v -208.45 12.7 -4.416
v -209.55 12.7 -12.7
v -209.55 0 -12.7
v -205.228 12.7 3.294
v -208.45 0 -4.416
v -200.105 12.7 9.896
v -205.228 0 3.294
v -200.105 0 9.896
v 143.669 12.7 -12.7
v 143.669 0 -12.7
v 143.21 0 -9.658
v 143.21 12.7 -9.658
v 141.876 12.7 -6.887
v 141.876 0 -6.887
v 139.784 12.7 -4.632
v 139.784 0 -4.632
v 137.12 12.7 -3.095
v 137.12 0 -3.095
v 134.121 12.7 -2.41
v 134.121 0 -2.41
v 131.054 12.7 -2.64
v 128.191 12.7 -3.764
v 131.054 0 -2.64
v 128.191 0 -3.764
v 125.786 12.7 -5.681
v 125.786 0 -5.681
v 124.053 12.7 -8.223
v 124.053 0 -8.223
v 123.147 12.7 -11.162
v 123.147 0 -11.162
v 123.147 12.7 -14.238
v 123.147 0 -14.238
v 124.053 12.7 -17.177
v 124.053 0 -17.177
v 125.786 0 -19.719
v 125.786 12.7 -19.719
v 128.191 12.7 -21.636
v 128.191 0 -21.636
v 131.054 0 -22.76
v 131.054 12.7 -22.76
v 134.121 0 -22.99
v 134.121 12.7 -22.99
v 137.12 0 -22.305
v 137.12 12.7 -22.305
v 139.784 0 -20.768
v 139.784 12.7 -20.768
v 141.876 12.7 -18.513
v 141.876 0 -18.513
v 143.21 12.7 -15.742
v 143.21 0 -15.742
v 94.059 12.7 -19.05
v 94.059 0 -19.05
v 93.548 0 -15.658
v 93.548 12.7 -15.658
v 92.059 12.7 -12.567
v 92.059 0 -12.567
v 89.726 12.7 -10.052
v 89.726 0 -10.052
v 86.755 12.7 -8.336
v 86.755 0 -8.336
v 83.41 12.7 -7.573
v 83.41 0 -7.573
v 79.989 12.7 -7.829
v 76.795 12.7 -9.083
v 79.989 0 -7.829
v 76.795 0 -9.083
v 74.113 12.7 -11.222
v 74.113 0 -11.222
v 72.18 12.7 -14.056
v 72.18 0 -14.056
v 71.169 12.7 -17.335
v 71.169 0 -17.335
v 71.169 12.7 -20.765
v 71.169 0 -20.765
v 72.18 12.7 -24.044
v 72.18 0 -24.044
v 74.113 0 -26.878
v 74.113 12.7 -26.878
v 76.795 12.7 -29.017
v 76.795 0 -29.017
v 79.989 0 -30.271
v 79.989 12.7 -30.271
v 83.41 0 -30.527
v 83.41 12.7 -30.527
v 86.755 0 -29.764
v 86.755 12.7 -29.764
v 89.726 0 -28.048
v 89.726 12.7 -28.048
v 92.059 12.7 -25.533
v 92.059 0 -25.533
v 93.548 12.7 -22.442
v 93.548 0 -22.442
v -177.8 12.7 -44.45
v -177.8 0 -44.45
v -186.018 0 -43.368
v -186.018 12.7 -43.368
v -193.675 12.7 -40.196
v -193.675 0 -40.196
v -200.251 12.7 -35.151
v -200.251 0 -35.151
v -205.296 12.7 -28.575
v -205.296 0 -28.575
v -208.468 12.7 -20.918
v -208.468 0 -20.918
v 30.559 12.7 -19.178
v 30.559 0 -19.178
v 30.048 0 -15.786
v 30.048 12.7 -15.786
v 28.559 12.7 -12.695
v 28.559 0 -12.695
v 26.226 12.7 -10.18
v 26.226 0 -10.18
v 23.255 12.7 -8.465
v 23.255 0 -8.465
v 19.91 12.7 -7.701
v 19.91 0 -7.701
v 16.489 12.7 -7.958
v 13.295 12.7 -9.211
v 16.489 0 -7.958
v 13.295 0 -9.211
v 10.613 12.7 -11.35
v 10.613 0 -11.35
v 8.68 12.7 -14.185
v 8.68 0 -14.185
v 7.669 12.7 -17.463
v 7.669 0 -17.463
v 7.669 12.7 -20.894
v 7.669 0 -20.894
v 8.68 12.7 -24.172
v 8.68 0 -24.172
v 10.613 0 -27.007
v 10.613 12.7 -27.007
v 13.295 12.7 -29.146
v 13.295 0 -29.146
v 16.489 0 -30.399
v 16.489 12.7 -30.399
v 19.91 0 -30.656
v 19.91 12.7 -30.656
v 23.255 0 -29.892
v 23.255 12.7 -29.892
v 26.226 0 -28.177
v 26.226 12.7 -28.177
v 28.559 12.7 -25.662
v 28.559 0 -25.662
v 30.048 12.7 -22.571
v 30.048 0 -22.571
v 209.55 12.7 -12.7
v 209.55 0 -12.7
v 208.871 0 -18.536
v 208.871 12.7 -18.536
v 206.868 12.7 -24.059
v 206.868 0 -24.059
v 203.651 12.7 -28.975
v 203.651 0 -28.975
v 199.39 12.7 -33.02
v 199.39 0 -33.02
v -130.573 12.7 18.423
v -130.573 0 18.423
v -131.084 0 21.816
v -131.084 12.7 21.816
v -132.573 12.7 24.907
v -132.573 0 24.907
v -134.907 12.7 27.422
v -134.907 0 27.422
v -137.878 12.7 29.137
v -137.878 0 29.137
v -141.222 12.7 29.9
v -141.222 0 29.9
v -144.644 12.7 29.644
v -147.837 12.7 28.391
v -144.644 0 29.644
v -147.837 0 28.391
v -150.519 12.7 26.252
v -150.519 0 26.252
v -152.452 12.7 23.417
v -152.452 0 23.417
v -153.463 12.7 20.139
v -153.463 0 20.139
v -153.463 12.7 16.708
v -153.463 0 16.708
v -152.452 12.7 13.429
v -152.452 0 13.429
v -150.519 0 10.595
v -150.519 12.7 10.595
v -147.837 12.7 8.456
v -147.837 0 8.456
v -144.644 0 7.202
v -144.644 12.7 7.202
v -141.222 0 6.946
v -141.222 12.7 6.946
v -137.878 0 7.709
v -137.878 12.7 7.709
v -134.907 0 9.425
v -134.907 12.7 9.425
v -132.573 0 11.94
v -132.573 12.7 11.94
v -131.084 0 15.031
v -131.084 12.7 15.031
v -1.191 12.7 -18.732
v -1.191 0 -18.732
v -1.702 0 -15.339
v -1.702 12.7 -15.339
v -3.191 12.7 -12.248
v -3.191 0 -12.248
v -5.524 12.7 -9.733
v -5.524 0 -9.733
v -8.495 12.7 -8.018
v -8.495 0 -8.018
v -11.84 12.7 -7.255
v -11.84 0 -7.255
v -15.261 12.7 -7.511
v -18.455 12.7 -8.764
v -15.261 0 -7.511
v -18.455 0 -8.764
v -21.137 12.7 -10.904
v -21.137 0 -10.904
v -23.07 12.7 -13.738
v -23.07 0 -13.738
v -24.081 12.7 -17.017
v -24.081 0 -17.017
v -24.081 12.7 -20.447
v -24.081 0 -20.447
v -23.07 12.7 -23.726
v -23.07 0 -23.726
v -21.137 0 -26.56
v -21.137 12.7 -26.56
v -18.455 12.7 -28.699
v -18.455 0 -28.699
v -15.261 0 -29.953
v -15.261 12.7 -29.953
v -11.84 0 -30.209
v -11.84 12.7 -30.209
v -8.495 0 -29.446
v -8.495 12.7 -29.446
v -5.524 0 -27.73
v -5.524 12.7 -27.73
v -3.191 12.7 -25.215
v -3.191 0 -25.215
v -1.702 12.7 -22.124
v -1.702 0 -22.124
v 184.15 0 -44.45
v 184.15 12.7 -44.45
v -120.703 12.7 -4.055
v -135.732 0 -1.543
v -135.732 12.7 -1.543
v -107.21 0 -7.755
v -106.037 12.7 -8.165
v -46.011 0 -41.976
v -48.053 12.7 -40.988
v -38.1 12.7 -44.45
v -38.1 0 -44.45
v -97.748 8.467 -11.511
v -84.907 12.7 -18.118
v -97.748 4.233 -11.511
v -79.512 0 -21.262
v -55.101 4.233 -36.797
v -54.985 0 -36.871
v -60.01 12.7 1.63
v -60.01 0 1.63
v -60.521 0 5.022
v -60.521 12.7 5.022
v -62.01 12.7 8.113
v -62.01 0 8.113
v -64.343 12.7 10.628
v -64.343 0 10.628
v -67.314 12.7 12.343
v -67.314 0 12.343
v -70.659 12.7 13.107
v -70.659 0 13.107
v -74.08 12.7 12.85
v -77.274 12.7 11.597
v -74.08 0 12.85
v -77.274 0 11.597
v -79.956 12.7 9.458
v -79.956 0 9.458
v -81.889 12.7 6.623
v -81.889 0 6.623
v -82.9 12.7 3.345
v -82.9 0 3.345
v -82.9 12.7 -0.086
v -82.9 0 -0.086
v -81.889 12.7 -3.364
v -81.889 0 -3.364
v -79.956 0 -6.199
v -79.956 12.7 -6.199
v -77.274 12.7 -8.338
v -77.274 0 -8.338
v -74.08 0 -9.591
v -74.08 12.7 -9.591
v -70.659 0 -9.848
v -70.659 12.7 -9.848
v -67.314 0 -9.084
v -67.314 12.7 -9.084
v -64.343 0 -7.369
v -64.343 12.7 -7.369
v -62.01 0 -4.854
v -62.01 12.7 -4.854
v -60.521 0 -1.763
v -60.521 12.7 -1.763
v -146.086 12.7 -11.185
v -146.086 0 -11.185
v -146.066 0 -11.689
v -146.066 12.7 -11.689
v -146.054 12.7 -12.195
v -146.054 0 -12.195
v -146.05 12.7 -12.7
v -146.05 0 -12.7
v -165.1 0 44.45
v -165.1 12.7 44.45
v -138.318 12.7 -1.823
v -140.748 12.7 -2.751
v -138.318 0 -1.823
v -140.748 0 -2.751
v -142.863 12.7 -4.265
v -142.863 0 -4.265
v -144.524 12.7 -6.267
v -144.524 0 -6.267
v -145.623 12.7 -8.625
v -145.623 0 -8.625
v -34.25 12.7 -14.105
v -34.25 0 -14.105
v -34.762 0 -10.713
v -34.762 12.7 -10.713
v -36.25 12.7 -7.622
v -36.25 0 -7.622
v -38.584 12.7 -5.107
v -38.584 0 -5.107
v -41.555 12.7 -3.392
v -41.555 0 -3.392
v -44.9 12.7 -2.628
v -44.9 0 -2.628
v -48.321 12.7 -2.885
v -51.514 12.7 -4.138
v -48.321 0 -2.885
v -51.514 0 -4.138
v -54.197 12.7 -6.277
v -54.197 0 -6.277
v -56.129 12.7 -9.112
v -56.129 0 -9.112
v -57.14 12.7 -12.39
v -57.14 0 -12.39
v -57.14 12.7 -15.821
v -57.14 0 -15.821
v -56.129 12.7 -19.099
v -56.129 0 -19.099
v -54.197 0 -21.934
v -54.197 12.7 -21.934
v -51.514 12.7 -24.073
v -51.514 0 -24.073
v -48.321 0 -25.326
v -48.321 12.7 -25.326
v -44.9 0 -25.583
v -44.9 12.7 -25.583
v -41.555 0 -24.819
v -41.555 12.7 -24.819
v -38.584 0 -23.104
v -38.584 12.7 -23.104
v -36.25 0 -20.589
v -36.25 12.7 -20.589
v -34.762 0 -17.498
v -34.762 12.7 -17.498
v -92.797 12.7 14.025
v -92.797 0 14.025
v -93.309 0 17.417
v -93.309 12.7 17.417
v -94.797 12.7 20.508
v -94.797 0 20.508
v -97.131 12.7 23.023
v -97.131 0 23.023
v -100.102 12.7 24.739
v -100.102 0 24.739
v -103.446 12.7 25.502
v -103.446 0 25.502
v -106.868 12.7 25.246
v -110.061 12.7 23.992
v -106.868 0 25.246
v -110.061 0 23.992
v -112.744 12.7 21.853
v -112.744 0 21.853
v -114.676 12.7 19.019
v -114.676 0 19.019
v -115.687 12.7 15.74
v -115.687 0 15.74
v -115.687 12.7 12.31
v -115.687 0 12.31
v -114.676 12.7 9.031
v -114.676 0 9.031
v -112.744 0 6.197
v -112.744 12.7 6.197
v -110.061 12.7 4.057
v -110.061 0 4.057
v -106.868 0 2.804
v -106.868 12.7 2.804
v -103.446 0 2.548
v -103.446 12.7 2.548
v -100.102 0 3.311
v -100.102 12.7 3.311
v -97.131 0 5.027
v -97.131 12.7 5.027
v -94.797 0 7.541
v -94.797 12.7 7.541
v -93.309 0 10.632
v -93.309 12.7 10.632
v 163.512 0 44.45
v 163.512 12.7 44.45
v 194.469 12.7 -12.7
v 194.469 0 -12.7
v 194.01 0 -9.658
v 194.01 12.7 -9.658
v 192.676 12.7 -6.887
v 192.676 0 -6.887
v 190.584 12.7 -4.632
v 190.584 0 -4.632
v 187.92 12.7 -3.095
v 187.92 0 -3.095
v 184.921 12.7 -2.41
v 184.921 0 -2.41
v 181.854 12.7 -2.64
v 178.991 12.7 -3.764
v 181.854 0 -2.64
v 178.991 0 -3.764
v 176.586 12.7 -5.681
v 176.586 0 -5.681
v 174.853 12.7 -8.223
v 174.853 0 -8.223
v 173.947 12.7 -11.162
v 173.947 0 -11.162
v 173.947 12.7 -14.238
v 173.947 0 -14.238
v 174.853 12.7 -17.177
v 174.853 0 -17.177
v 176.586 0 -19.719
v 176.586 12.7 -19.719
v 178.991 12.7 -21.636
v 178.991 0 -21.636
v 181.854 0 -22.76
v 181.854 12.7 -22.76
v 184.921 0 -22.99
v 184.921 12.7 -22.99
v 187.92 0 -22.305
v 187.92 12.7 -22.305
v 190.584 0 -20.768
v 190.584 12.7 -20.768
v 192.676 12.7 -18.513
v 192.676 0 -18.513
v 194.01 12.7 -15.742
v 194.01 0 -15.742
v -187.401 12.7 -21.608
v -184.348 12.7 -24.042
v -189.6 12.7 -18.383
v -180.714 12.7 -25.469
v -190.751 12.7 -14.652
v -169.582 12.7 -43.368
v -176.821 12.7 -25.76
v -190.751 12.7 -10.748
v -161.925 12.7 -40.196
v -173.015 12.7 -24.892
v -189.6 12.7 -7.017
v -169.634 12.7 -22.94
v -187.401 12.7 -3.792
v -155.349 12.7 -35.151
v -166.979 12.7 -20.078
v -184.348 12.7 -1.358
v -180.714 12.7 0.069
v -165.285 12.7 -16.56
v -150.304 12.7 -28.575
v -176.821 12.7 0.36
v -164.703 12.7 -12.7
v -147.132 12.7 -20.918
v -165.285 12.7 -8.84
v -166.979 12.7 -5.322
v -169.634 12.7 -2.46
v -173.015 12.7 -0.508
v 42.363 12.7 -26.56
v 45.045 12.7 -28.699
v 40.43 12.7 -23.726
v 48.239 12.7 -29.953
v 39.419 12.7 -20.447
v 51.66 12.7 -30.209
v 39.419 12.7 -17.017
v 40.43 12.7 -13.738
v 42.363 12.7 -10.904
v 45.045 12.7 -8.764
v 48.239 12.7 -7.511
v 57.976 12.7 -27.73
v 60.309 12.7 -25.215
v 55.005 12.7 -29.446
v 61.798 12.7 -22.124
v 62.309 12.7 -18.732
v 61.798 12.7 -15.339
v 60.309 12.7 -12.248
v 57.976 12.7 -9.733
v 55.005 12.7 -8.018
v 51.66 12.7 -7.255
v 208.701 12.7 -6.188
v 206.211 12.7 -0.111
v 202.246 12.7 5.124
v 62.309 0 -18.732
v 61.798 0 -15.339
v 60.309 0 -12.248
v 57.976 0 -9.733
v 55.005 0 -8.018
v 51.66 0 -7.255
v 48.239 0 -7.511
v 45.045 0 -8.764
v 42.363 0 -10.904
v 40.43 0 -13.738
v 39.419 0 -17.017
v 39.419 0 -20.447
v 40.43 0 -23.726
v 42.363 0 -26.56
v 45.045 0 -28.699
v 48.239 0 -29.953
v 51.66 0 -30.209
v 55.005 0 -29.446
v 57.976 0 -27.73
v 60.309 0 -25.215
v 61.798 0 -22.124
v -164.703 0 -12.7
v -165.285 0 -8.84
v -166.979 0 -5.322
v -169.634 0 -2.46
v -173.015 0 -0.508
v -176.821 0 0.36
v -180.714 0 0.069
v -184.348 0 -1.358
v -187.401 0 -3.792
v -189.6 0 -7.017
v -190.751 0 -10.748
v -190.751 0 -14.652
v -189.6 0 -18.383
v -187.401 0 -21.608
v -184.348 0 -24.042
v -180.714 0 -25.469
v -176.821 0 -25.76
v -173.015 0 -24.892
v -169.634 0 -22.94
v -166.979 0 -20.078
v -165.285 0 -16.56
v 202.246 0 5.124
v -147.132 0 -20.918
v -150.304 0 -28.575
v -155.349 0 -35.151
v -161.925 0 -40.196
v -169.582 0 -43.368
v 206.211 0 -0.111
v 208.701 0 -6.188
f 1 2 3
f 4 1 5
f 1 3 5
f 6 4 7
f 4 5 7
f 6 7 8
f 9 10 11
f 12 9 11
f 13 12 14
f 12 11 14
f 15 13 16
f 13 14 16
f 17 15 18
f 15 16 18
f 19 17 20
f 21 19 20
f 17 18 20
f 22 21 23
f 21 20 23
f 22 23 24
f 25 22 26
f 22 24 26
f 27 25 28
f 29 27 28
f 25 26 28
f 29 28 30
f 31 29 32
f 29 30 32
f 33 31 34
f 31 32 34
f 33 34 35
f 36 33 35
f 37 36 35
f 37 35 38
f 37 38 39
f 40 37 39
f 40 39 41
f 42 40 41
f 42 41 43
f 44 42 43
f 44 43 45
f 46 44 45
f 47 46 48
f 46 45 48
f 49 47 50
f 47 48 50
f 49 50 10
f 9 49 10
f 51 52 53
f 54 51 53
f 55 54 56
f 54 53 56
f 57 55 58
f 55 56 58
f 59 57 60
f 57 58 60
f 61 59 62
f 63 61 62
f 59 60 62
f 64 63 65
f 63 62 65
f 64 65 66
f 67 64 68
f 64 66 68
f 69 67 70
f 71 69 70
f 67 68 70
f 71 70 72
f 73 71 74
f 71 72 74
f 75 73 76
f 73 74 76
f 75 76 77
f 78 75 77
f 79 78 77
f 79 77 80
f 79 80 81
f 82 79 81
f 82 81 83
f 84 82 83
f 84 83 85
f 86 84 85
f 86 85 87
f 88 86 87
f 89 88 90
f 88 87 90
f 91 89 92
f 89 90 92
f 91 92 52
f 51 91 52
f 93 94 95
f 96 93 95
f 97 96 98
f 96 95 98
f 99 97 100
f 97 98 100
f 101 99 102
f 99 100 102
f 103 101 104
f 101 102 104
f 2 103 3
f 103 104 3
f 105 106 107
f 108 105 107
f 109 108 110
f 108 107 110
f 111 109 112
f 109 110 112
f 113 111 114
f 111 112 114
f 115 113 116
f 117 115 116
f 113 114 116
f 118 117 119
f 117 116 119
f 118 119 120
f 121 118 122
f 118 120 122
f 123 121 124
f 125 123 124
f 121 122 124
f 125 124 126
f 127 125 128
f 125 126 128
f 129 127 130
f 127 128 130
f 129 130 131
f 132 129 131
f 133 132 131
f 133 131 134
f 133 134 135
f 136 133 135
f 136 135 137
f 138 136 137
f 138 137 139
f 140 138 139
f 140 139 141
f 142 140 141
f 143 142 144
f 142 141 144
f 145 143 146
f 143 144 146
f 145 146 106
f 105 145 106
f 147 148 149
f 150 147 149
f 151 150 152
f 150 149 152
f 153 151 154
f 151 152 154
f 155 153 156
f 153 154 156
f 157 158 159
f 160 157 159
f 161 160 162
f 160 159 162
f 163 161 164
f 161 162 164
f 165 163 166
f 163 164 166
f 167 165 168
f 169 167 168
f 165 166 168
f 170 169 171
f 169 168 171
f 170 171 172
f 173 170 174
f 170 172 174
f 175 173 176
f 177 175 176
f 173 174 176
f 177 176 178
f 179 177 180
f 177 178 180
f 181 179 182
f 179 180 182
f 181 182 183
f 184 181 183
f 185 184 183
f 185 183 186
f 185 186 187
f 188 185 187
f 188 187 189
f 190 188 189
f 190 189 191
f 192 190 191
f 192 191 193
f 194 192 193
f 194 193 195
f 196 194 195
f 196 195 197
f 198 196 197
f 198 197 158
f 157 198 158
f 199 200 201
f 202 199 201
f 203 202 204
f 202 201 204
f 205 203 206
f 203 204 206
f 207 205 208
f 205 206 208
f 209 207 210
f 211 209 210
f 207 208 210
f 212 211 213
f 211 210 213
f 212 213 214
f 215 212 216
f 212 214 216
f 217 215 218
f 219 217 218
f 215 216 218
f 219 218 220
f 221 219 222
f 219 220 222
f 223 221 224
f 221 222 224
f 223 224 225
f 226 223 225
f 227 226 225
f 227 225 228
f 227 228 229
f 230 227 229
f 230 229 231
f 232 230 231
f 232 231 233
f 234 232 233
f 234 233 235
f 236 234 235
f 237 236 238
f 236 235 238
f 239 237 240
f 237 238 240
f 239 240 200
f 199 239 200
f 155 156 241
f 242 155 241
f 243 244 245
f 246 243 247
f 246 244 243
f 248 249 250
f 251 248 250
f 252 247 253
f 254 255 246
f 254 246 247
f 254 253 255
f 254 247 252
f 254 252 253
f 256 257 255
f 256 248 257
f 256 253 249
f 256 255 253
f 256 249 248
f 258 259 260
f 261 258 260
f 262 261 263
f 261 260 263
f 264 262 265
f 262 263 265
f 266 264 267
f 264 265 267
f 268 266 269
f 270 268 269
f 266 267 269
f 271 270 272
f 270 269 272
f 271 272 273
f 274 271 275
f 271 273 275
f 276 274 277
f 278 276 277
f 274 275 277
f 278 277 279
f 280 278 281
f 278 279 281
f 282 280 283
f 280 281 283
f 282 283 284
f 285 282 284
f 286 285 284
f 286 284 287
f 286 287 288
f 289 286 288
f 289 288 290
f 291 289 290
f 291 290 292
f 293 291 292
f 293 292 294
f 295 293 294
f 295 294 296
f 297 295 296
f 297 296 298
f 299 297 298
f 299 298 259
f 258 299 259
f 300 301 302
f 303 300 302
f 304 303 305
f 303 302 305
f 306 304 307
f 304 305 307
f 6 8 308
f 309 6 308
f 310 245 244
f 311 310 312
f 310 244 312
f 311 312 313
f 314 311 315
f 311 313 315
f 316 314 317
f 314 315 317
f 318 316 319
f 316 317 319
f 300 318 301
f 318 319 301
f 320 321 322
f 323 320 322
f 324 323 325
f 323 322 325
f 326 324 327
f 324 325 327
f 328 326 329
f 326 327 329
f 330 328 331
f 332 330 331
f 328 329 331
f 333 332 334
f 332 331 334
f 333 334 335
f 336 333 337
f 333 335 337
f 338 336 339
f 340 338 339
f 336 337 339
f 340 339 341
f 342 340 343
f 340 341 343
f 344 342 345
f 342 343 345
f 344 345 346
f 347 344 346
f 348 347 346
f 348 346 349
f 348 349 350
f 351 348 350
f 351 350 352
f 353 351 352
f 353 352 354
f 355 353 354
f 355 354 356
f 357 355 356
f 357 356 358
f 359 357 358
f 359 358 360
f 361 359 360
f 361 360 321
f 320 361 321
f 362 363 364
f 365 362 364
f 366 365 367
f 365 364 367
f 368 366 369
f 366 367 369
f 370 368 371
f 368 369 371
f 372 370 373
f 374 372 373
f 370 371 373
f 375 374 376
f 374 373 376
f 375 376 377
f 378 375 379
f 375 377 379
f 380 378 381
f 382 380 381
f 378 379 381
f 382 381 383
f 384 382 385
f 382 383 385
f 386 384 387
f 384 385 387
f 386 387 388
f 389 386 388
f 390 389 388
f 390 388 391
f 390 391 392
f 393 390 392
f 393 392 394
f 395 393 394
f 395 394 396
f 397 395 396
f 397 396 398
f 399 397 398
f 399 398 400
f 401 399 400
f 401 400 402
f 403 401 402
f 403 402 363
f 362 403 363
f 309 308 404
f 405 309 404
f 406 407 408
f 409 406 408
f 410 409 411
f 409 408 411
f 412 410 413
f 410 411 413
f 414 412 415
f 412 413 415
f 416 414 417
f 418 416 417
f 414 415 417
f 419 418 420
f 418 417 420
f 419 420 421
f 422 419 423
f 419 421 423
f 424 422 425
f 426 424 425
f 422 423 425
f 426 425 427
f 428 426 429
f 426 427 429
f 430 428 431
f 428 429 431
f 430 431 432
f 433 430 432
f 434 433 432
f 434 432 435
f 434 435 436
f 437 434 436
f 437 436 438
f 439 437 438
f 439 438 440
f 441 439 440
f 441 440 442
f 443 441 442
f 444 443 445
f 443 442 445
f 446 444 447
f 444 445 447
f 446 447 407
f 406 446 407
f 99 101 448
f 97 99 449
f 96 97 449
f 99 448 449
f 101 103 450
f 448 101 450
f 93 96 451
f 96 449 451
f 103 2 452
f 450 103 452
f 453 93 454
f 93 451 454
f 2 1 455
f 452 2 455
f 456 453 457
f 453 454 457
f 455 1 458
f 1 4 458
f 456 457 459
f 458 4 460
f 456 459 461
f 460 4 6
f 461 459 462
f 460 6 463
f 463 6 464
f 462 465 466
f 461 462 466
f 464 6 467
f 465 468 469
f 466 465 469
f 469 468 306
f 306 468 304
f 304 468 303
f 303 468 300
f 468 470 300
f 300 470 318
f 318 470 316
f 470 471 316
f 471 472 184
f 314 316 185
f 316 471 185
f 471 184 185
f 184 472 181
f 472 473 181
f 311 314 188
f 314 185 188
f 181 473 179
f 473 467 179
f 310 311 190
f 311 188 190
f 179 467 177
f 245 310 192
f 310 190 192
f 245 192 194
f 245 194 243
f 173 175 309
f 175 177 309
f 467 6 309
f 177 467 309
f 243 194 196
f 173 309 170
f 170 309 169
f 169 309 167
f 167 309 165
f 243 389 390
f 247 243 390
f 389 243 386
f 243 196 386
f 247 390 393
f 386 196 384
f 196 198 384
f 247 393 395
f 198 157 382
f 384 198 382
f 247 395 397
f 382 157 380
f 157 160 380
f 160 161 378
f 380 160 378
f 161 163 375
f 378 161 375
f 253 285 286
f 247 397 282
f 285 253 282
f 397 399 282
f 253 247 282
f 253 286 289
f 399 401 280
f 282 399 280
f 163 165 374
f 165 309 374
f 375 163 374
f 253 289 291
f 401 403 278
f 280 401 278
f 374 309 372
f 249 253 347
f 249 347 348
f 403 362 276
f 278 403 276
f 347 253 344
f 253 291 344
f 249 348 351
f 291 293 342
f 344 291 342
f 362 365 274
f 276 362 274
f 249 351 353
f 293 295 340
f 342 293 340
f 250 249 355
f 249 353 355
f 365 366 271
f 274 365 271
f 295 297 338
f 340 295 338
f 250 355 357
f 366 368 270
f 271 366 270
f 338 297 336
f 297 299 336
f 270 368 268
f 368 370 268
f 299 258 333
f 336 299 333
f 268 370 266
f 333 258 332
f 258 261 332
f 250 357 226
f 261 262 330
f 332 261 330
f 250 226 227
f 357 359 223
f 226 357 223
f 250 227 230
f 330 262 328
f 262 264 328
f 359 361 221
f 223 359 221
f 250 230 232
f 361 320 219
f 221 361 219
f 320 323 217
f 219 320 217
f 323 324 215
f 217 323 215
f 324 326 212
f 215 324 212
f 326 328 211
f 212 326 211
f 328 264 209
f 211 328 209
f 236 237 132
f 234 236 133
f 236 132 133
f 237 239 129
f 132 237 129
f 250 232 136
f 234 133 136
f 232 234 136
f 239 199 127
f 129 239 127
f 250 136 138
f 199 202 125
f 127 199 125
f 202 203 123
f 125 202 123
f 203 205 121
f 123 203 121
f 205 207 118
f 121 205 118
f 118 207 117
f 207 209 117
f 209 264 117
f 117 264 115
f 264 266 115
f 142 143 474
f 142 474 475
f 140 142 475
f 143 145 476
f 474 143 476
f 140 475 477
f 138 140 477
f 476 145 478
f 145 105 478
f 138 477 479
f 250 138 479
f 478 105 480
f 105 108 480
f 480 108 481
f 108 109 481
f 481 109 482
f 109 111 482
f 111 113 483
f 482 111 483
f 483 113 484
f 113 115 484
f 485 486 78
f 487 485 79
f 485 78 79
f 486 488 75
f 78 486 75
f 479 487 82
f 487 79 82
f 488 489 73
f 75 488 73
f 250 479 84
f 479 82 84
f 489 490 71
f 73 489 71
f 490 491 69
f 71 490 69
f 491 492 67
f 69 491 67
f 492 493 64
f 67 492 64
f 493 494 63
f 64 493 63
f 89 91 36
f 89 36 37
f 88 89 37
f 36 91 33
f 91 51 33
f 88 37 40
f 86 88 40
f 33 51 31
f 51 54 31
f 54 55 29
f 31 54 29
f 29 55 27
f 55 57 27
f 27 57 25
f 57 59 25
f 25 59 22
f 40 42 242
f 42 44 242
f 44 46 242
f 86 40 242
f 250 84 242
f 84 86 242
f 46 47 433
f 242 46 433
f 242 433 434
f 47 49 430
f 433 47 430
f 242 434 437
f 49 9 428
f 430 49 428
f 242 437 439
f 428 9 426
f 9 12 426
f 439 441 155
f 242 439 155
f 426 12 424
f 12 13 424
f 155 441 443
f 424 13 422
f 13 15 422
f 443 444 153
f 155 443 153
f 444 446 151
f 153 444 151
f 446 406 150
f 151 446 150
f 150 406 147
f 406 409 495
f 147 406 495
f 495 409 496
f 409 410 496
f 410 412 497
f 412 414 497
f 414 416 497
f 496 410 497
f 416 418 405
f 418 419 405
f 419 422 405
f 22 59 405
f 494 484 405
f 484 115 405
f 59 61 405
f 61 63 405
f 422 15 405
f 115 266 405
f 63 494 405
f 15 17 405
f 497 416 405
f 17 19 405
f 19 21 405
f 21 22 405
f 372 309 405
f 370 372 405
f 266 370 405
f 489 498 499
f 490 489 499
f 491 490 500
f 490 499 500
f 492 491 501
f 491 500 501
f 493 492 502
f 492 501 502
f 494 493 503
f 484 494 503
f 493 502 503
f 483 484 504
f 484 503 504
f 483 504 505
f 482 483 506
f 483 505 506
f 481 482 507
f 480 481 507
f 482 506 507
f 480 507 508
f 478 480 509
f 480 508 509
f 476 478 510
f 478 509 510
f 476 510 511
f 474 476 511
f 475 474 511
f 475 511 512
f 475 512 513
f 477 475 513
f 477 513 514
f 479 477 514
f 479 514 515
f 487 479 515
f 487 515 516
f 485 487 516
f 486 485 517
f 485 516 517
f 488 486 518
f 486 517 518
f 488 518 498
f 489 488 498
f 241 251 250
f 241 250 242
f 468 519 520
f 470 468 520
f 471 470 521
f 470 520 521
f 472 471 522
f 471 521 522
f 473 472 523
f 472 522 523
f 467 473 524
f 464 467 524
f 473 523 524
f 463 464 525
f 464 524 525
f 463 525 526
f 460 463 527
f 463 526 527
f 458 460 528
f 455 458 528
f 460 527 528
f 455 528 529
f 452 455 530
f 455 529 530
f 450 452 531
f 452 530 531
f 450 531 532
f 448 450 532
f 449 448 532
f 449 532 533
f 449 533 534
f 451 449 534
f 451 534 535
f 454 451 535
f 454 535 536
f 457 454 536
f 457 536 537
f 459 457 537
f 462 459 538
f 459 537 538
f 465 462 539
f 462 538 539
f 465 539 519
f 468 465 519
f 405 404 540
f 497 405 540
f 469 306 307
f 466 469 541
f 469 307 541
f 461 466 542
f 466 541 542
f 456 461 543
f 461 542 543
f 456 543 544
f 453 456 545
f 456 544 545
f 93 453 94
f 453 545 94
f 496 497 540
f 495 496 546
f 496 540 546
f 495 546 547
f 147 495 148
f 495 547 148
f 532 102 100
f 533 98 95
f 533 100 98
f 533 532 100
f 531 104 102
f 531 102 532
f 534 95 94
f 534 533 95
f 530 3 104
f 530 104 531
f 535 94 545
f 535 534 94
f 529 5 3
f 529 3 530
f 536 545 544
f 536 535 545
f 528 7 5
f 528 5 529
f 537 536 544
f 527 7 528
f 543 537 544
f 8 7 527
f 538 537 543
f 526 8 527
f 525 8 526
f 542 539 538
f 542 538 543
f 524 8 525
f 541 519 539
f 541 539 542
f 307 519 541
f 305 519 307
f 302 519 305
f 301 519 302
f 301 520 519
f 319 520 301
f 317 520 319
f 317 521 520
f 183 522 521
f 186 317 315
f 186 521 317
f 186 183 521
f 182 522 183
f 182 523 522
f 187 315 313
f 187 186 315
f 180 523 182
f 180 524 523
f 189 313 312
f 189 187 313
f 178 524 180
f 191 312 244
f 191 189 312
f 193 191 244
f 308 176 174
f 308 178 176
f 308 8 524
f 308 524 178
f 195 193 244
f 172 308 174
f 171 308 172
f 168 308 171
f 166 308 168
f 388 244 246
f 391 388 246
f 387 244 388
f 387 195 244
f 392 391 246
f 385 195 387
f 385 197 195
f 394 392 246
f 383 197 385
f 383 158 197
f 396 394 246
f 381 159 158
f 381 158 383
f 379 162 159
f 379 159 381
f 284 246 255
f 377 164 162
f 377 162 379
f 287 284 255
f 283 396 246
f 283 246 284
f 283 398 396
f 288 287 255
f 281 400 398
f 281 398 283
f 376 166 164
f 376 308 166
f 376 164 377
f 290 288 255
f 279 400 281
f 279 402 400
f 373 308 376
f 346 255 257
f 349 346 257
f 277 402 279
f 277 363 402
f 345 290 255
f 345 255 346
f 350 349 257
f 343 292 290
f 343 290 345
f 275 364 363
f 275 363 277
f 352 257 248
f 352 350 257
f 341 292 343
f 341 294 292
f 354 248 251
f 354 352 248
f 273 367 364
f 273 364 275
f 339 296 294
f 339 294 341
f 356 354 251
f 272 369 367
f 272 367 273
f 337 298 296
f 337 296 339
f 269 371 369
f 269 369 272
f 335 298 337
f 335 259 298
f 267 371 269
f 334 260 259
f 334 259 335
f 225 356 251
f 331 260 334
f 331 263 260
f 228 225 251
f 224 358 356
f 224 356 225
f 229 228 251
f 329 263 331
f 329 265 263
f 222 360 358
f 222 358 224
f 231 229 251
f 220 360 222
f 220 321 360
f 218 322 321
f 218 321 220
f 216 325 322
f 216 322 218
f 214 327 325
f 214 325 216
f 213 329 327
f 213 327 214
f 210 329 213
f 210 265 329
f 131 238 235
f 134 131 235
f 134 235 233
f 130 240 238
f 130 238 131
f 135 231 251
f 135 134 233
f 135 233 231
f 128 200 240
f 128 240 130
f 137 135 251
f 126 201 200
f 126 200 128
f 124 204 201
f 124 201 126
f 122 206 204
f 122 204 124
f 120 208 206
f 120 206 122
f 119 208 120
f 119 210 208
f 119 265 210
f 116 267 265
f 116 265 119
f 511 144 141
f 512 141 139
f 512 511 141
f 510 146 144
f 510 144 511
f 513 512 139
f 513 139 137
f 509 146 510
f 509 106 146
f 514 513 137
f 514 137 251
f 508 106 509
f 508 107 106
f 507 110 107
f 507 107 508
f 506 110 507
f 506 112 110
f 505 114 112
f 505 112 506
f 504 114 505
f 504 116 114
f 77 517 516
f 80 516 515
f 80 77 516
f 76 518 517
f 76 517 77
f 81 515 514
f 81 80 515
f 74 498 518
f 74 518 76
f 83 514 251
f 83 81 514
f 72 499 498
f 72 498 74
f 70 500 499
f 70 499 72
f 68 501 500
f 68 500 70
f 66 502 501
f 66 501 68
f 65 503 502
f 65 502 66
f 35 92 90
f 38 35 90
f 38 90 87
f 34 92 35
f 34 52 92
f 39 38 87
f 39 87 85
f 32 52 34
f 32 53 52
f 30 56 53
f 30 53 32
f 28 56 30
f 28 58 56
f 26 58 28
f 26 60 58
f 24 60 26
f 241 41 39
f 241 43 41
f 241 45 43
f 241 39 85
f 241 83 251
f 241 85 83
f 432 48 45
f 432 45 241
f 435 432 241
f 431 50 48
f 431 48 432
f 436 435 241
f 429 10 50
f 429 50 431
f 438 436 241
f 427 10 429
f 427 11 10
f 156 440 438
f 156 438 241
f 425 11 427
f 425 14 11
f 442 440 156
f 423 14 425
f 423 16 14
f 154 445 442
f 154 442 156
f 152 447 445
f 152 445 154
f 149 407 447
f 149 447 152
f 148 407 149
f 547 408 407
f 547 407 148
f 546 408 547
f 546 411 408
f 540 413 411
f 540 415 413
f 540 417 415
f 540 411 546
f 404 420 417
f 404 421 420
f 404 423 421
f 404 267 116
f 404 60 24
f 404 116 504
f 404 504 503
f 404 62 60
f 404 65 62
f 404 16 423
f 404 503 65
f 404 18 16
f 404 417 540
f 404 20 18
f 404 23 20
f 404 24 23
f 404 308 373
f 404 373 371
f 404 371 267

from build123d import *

# Parameters (mm, degrees)
F0_W      = 419.1
F0_H      = 88.9
F0_R      = 13.096875
F0_R_2    = 11.509375
F0_R_3    = 10.31875
F1_DEPTH  = 12.7
F2_R      = 11.509375
F3_DEPTH  = 12.701
F5_DEPTH  = 12.701
F7_DEPTH  = 12.7010001
F9_DEPTH  = 12.7
F10_R     = 13.096875
F10_R_2   = 11.509375
F10_R_3   = 7.9375
F11_DEPTH = 25.4010001


with BuildPart() as f1:
    # F0 (on Front) → F1 (new body)
    with BuildSketch(Plane.XZ):
        Rectangle(F0_W, F0_H)
        with Locations((-177.8, -12.7)):
            Circle(F0_R, mode=Mode.SUBTRACT)
        with Locations((-12.7, -18.7318846583)):
            Circle(F0_R_2, mode=Mode.SUBTRACT)
        with Locations((19.05, -19.1783625633)):
            Circle(F0_R_2, mode=Mode.SUBTRACT)
        with Locations((50.8, -18.7318846583)):
            Circle(F0_R_2, mode=Mode.SUBTRACT)
        with Locations((82.55, -19.05)):
            Circle(F0_R_2, mode=Mode.SUBTRACT)
        with Locations((133.35, -12.7)):
            Circle(F0_R_3, mode=Mode.SUBTRACT)
        with Locations((184.15, -12.7)):
            Circle(F0_R_3, mode=Mode.SUBTRACT)
    extrude(amount=-F1_DEPTH)

    # F2 (on face) → F3 (cut, through all)
    with BuildSketch(Plane.XZ):
        with Locations((-142.08252, 18.4232164174)):
            Circle(F2_R)
        with Locations((-104.306563735, 14.0248946846)):
            Circle(F2_R)
        with Locations((-71.5190842748, 1.6296281246)):
            Circle(F2_R)
        with Locations((-45.7596568011, -14.1053809535)):
            Circle(F2_R)
    extrude(amount=-F3_DEPTH, mode=Mode.SUBTRACT)

    # F4 (on face) → F5 (cut, through all)
    with BuildSketch(Plane.XZ):
        with BuildLine():
            ThreePointArc((-209.55, -12.7), (-207.0936907923, -0.4549120148), (-200.1048233219, 9.8955162937))
            Line((-200.1048233219, 9.8955162937), (-165.1, 44.45))
            Line((-165.1, 44.45), (-209.55, 44.45))
            Line((-209.55, 44.45), (-209.55, -12.7))
        make_face()
        with BuildLine():
            Line((-209.55, -44.45), (-177.8, -44.45))
            ThreePointArc((-177.8, -44.45), (-200.2506403027, -35.1506403027), (-209.55, -12.7))
            Line((-209.55, -12.7), (-209.55, -44.45))
        make_face()
        with BuildLine():
            ThreePointArc((-146.0861882684, -11.1845312756), (-146.0590483564, -11.9420496313), (-146.05, -12.7))
            ThreePointArc((-146.05, -12.7), (-155.3493596973, -35.1506403027), (-177.8, -44.45))
            Line((-177.8, -44.45), (-38.1, -44.45))
            add(Edge.make_bspline(
                [(-135.731991463, -1.5425124657), (-123.0853934374, -3.2529361125), (-97.8098704079, -7.8915227069), (-55.1757360667, -37.2664877617), (-44.6494842281, -43.1637651569), (-38.1, -44.45)],
                knots=[0, 0, 0, 0, 0.3555356426, 0.7550234425, 1, 1, 1, 1], degree=3))
            ThreePointArc((-135.731991463, -1.5425124657), (-142.8632378904, -4.2650367263), (-146.0861882684, -11.1845312756))
        make_face()
    extrude(amount=-F5_DEPTH, mode=Mode.SUBTRACT)

    # F6 (on face) → F7 (cut, through all)
    with BuildSketch(Plane.XZ):
        with BuildLine():
            Line((209.55, 44.45), (163.5125, 44.45))
            Line((163.5125, 44.45), (202.2463189928, 5.1236707474))
            ThreePointArc((202.2463189928, 5.1236707474), (207.6532604037, -3.0689694011), (209.55, -12.6999998198))
            Line((209.55, -12.6999998198), (209.55, 44.45))
        make_face()
        with BuildLine():
            Line((209.55, -44.45), (209.55, -12.6999998198))
            ThreePointArc((209.55, -12.6999998198), (206.8684506917, -24.0592252451), (199.39, -33.02))
            Line((199.39, -33.02), (184.15, -44.45))
            Line((184.15, -44.45), (209.55, -44.45))
        make_face()
    extrude(amount=-F7_DEPTH, mode=Mode.SUBTRACT)


with BuildPart() as f9:
    # F8 (on Front) → F9 (new body)
    with BuildSketch(Plane.XZ):
        with BuildLine():
            Line((180.975, 31.75), (-180.975, 31.75))
            ThreePointArc((-180.975, 31.75), (-212.725, 0), (-180.975, -31.75))
            Line((-180.975, -31.75), (180.975, -31.75))
            ThreePointArc((180.975, -31.75), (212.725, 0), (180.975, 31.75))
        make_face()
    extrude(amount=F9_DEPTH)

    # F10 (on face) → F11 (cut, through all)
    with BuildSketch(Plane.XZ.offset(12.7)):
        with Locations((-180.975, 0)):
            Circle(F10_R)
        with Locations((-133.35, 0)):
            Circle(F10_R_2)
        with Locations((-107.95, 6.35)):
            Circle(F10_R_2)
        with Locations((-82.55, 7.0877922699)):
            Circle(F10_R_2)
        with Locations((-57.15, 7.0877922699)):
            Circle(F10_R_2)
        with Locations((104.7790011828, 0.7808740327)):
            Circle(F10_R_3)
        with Locations((180.975, 0)):
            Circle(F10_R_3)
    extrude(amount=-F11_DEPTH, mode=Mode.SUBTRACT)


solid = f1.part
